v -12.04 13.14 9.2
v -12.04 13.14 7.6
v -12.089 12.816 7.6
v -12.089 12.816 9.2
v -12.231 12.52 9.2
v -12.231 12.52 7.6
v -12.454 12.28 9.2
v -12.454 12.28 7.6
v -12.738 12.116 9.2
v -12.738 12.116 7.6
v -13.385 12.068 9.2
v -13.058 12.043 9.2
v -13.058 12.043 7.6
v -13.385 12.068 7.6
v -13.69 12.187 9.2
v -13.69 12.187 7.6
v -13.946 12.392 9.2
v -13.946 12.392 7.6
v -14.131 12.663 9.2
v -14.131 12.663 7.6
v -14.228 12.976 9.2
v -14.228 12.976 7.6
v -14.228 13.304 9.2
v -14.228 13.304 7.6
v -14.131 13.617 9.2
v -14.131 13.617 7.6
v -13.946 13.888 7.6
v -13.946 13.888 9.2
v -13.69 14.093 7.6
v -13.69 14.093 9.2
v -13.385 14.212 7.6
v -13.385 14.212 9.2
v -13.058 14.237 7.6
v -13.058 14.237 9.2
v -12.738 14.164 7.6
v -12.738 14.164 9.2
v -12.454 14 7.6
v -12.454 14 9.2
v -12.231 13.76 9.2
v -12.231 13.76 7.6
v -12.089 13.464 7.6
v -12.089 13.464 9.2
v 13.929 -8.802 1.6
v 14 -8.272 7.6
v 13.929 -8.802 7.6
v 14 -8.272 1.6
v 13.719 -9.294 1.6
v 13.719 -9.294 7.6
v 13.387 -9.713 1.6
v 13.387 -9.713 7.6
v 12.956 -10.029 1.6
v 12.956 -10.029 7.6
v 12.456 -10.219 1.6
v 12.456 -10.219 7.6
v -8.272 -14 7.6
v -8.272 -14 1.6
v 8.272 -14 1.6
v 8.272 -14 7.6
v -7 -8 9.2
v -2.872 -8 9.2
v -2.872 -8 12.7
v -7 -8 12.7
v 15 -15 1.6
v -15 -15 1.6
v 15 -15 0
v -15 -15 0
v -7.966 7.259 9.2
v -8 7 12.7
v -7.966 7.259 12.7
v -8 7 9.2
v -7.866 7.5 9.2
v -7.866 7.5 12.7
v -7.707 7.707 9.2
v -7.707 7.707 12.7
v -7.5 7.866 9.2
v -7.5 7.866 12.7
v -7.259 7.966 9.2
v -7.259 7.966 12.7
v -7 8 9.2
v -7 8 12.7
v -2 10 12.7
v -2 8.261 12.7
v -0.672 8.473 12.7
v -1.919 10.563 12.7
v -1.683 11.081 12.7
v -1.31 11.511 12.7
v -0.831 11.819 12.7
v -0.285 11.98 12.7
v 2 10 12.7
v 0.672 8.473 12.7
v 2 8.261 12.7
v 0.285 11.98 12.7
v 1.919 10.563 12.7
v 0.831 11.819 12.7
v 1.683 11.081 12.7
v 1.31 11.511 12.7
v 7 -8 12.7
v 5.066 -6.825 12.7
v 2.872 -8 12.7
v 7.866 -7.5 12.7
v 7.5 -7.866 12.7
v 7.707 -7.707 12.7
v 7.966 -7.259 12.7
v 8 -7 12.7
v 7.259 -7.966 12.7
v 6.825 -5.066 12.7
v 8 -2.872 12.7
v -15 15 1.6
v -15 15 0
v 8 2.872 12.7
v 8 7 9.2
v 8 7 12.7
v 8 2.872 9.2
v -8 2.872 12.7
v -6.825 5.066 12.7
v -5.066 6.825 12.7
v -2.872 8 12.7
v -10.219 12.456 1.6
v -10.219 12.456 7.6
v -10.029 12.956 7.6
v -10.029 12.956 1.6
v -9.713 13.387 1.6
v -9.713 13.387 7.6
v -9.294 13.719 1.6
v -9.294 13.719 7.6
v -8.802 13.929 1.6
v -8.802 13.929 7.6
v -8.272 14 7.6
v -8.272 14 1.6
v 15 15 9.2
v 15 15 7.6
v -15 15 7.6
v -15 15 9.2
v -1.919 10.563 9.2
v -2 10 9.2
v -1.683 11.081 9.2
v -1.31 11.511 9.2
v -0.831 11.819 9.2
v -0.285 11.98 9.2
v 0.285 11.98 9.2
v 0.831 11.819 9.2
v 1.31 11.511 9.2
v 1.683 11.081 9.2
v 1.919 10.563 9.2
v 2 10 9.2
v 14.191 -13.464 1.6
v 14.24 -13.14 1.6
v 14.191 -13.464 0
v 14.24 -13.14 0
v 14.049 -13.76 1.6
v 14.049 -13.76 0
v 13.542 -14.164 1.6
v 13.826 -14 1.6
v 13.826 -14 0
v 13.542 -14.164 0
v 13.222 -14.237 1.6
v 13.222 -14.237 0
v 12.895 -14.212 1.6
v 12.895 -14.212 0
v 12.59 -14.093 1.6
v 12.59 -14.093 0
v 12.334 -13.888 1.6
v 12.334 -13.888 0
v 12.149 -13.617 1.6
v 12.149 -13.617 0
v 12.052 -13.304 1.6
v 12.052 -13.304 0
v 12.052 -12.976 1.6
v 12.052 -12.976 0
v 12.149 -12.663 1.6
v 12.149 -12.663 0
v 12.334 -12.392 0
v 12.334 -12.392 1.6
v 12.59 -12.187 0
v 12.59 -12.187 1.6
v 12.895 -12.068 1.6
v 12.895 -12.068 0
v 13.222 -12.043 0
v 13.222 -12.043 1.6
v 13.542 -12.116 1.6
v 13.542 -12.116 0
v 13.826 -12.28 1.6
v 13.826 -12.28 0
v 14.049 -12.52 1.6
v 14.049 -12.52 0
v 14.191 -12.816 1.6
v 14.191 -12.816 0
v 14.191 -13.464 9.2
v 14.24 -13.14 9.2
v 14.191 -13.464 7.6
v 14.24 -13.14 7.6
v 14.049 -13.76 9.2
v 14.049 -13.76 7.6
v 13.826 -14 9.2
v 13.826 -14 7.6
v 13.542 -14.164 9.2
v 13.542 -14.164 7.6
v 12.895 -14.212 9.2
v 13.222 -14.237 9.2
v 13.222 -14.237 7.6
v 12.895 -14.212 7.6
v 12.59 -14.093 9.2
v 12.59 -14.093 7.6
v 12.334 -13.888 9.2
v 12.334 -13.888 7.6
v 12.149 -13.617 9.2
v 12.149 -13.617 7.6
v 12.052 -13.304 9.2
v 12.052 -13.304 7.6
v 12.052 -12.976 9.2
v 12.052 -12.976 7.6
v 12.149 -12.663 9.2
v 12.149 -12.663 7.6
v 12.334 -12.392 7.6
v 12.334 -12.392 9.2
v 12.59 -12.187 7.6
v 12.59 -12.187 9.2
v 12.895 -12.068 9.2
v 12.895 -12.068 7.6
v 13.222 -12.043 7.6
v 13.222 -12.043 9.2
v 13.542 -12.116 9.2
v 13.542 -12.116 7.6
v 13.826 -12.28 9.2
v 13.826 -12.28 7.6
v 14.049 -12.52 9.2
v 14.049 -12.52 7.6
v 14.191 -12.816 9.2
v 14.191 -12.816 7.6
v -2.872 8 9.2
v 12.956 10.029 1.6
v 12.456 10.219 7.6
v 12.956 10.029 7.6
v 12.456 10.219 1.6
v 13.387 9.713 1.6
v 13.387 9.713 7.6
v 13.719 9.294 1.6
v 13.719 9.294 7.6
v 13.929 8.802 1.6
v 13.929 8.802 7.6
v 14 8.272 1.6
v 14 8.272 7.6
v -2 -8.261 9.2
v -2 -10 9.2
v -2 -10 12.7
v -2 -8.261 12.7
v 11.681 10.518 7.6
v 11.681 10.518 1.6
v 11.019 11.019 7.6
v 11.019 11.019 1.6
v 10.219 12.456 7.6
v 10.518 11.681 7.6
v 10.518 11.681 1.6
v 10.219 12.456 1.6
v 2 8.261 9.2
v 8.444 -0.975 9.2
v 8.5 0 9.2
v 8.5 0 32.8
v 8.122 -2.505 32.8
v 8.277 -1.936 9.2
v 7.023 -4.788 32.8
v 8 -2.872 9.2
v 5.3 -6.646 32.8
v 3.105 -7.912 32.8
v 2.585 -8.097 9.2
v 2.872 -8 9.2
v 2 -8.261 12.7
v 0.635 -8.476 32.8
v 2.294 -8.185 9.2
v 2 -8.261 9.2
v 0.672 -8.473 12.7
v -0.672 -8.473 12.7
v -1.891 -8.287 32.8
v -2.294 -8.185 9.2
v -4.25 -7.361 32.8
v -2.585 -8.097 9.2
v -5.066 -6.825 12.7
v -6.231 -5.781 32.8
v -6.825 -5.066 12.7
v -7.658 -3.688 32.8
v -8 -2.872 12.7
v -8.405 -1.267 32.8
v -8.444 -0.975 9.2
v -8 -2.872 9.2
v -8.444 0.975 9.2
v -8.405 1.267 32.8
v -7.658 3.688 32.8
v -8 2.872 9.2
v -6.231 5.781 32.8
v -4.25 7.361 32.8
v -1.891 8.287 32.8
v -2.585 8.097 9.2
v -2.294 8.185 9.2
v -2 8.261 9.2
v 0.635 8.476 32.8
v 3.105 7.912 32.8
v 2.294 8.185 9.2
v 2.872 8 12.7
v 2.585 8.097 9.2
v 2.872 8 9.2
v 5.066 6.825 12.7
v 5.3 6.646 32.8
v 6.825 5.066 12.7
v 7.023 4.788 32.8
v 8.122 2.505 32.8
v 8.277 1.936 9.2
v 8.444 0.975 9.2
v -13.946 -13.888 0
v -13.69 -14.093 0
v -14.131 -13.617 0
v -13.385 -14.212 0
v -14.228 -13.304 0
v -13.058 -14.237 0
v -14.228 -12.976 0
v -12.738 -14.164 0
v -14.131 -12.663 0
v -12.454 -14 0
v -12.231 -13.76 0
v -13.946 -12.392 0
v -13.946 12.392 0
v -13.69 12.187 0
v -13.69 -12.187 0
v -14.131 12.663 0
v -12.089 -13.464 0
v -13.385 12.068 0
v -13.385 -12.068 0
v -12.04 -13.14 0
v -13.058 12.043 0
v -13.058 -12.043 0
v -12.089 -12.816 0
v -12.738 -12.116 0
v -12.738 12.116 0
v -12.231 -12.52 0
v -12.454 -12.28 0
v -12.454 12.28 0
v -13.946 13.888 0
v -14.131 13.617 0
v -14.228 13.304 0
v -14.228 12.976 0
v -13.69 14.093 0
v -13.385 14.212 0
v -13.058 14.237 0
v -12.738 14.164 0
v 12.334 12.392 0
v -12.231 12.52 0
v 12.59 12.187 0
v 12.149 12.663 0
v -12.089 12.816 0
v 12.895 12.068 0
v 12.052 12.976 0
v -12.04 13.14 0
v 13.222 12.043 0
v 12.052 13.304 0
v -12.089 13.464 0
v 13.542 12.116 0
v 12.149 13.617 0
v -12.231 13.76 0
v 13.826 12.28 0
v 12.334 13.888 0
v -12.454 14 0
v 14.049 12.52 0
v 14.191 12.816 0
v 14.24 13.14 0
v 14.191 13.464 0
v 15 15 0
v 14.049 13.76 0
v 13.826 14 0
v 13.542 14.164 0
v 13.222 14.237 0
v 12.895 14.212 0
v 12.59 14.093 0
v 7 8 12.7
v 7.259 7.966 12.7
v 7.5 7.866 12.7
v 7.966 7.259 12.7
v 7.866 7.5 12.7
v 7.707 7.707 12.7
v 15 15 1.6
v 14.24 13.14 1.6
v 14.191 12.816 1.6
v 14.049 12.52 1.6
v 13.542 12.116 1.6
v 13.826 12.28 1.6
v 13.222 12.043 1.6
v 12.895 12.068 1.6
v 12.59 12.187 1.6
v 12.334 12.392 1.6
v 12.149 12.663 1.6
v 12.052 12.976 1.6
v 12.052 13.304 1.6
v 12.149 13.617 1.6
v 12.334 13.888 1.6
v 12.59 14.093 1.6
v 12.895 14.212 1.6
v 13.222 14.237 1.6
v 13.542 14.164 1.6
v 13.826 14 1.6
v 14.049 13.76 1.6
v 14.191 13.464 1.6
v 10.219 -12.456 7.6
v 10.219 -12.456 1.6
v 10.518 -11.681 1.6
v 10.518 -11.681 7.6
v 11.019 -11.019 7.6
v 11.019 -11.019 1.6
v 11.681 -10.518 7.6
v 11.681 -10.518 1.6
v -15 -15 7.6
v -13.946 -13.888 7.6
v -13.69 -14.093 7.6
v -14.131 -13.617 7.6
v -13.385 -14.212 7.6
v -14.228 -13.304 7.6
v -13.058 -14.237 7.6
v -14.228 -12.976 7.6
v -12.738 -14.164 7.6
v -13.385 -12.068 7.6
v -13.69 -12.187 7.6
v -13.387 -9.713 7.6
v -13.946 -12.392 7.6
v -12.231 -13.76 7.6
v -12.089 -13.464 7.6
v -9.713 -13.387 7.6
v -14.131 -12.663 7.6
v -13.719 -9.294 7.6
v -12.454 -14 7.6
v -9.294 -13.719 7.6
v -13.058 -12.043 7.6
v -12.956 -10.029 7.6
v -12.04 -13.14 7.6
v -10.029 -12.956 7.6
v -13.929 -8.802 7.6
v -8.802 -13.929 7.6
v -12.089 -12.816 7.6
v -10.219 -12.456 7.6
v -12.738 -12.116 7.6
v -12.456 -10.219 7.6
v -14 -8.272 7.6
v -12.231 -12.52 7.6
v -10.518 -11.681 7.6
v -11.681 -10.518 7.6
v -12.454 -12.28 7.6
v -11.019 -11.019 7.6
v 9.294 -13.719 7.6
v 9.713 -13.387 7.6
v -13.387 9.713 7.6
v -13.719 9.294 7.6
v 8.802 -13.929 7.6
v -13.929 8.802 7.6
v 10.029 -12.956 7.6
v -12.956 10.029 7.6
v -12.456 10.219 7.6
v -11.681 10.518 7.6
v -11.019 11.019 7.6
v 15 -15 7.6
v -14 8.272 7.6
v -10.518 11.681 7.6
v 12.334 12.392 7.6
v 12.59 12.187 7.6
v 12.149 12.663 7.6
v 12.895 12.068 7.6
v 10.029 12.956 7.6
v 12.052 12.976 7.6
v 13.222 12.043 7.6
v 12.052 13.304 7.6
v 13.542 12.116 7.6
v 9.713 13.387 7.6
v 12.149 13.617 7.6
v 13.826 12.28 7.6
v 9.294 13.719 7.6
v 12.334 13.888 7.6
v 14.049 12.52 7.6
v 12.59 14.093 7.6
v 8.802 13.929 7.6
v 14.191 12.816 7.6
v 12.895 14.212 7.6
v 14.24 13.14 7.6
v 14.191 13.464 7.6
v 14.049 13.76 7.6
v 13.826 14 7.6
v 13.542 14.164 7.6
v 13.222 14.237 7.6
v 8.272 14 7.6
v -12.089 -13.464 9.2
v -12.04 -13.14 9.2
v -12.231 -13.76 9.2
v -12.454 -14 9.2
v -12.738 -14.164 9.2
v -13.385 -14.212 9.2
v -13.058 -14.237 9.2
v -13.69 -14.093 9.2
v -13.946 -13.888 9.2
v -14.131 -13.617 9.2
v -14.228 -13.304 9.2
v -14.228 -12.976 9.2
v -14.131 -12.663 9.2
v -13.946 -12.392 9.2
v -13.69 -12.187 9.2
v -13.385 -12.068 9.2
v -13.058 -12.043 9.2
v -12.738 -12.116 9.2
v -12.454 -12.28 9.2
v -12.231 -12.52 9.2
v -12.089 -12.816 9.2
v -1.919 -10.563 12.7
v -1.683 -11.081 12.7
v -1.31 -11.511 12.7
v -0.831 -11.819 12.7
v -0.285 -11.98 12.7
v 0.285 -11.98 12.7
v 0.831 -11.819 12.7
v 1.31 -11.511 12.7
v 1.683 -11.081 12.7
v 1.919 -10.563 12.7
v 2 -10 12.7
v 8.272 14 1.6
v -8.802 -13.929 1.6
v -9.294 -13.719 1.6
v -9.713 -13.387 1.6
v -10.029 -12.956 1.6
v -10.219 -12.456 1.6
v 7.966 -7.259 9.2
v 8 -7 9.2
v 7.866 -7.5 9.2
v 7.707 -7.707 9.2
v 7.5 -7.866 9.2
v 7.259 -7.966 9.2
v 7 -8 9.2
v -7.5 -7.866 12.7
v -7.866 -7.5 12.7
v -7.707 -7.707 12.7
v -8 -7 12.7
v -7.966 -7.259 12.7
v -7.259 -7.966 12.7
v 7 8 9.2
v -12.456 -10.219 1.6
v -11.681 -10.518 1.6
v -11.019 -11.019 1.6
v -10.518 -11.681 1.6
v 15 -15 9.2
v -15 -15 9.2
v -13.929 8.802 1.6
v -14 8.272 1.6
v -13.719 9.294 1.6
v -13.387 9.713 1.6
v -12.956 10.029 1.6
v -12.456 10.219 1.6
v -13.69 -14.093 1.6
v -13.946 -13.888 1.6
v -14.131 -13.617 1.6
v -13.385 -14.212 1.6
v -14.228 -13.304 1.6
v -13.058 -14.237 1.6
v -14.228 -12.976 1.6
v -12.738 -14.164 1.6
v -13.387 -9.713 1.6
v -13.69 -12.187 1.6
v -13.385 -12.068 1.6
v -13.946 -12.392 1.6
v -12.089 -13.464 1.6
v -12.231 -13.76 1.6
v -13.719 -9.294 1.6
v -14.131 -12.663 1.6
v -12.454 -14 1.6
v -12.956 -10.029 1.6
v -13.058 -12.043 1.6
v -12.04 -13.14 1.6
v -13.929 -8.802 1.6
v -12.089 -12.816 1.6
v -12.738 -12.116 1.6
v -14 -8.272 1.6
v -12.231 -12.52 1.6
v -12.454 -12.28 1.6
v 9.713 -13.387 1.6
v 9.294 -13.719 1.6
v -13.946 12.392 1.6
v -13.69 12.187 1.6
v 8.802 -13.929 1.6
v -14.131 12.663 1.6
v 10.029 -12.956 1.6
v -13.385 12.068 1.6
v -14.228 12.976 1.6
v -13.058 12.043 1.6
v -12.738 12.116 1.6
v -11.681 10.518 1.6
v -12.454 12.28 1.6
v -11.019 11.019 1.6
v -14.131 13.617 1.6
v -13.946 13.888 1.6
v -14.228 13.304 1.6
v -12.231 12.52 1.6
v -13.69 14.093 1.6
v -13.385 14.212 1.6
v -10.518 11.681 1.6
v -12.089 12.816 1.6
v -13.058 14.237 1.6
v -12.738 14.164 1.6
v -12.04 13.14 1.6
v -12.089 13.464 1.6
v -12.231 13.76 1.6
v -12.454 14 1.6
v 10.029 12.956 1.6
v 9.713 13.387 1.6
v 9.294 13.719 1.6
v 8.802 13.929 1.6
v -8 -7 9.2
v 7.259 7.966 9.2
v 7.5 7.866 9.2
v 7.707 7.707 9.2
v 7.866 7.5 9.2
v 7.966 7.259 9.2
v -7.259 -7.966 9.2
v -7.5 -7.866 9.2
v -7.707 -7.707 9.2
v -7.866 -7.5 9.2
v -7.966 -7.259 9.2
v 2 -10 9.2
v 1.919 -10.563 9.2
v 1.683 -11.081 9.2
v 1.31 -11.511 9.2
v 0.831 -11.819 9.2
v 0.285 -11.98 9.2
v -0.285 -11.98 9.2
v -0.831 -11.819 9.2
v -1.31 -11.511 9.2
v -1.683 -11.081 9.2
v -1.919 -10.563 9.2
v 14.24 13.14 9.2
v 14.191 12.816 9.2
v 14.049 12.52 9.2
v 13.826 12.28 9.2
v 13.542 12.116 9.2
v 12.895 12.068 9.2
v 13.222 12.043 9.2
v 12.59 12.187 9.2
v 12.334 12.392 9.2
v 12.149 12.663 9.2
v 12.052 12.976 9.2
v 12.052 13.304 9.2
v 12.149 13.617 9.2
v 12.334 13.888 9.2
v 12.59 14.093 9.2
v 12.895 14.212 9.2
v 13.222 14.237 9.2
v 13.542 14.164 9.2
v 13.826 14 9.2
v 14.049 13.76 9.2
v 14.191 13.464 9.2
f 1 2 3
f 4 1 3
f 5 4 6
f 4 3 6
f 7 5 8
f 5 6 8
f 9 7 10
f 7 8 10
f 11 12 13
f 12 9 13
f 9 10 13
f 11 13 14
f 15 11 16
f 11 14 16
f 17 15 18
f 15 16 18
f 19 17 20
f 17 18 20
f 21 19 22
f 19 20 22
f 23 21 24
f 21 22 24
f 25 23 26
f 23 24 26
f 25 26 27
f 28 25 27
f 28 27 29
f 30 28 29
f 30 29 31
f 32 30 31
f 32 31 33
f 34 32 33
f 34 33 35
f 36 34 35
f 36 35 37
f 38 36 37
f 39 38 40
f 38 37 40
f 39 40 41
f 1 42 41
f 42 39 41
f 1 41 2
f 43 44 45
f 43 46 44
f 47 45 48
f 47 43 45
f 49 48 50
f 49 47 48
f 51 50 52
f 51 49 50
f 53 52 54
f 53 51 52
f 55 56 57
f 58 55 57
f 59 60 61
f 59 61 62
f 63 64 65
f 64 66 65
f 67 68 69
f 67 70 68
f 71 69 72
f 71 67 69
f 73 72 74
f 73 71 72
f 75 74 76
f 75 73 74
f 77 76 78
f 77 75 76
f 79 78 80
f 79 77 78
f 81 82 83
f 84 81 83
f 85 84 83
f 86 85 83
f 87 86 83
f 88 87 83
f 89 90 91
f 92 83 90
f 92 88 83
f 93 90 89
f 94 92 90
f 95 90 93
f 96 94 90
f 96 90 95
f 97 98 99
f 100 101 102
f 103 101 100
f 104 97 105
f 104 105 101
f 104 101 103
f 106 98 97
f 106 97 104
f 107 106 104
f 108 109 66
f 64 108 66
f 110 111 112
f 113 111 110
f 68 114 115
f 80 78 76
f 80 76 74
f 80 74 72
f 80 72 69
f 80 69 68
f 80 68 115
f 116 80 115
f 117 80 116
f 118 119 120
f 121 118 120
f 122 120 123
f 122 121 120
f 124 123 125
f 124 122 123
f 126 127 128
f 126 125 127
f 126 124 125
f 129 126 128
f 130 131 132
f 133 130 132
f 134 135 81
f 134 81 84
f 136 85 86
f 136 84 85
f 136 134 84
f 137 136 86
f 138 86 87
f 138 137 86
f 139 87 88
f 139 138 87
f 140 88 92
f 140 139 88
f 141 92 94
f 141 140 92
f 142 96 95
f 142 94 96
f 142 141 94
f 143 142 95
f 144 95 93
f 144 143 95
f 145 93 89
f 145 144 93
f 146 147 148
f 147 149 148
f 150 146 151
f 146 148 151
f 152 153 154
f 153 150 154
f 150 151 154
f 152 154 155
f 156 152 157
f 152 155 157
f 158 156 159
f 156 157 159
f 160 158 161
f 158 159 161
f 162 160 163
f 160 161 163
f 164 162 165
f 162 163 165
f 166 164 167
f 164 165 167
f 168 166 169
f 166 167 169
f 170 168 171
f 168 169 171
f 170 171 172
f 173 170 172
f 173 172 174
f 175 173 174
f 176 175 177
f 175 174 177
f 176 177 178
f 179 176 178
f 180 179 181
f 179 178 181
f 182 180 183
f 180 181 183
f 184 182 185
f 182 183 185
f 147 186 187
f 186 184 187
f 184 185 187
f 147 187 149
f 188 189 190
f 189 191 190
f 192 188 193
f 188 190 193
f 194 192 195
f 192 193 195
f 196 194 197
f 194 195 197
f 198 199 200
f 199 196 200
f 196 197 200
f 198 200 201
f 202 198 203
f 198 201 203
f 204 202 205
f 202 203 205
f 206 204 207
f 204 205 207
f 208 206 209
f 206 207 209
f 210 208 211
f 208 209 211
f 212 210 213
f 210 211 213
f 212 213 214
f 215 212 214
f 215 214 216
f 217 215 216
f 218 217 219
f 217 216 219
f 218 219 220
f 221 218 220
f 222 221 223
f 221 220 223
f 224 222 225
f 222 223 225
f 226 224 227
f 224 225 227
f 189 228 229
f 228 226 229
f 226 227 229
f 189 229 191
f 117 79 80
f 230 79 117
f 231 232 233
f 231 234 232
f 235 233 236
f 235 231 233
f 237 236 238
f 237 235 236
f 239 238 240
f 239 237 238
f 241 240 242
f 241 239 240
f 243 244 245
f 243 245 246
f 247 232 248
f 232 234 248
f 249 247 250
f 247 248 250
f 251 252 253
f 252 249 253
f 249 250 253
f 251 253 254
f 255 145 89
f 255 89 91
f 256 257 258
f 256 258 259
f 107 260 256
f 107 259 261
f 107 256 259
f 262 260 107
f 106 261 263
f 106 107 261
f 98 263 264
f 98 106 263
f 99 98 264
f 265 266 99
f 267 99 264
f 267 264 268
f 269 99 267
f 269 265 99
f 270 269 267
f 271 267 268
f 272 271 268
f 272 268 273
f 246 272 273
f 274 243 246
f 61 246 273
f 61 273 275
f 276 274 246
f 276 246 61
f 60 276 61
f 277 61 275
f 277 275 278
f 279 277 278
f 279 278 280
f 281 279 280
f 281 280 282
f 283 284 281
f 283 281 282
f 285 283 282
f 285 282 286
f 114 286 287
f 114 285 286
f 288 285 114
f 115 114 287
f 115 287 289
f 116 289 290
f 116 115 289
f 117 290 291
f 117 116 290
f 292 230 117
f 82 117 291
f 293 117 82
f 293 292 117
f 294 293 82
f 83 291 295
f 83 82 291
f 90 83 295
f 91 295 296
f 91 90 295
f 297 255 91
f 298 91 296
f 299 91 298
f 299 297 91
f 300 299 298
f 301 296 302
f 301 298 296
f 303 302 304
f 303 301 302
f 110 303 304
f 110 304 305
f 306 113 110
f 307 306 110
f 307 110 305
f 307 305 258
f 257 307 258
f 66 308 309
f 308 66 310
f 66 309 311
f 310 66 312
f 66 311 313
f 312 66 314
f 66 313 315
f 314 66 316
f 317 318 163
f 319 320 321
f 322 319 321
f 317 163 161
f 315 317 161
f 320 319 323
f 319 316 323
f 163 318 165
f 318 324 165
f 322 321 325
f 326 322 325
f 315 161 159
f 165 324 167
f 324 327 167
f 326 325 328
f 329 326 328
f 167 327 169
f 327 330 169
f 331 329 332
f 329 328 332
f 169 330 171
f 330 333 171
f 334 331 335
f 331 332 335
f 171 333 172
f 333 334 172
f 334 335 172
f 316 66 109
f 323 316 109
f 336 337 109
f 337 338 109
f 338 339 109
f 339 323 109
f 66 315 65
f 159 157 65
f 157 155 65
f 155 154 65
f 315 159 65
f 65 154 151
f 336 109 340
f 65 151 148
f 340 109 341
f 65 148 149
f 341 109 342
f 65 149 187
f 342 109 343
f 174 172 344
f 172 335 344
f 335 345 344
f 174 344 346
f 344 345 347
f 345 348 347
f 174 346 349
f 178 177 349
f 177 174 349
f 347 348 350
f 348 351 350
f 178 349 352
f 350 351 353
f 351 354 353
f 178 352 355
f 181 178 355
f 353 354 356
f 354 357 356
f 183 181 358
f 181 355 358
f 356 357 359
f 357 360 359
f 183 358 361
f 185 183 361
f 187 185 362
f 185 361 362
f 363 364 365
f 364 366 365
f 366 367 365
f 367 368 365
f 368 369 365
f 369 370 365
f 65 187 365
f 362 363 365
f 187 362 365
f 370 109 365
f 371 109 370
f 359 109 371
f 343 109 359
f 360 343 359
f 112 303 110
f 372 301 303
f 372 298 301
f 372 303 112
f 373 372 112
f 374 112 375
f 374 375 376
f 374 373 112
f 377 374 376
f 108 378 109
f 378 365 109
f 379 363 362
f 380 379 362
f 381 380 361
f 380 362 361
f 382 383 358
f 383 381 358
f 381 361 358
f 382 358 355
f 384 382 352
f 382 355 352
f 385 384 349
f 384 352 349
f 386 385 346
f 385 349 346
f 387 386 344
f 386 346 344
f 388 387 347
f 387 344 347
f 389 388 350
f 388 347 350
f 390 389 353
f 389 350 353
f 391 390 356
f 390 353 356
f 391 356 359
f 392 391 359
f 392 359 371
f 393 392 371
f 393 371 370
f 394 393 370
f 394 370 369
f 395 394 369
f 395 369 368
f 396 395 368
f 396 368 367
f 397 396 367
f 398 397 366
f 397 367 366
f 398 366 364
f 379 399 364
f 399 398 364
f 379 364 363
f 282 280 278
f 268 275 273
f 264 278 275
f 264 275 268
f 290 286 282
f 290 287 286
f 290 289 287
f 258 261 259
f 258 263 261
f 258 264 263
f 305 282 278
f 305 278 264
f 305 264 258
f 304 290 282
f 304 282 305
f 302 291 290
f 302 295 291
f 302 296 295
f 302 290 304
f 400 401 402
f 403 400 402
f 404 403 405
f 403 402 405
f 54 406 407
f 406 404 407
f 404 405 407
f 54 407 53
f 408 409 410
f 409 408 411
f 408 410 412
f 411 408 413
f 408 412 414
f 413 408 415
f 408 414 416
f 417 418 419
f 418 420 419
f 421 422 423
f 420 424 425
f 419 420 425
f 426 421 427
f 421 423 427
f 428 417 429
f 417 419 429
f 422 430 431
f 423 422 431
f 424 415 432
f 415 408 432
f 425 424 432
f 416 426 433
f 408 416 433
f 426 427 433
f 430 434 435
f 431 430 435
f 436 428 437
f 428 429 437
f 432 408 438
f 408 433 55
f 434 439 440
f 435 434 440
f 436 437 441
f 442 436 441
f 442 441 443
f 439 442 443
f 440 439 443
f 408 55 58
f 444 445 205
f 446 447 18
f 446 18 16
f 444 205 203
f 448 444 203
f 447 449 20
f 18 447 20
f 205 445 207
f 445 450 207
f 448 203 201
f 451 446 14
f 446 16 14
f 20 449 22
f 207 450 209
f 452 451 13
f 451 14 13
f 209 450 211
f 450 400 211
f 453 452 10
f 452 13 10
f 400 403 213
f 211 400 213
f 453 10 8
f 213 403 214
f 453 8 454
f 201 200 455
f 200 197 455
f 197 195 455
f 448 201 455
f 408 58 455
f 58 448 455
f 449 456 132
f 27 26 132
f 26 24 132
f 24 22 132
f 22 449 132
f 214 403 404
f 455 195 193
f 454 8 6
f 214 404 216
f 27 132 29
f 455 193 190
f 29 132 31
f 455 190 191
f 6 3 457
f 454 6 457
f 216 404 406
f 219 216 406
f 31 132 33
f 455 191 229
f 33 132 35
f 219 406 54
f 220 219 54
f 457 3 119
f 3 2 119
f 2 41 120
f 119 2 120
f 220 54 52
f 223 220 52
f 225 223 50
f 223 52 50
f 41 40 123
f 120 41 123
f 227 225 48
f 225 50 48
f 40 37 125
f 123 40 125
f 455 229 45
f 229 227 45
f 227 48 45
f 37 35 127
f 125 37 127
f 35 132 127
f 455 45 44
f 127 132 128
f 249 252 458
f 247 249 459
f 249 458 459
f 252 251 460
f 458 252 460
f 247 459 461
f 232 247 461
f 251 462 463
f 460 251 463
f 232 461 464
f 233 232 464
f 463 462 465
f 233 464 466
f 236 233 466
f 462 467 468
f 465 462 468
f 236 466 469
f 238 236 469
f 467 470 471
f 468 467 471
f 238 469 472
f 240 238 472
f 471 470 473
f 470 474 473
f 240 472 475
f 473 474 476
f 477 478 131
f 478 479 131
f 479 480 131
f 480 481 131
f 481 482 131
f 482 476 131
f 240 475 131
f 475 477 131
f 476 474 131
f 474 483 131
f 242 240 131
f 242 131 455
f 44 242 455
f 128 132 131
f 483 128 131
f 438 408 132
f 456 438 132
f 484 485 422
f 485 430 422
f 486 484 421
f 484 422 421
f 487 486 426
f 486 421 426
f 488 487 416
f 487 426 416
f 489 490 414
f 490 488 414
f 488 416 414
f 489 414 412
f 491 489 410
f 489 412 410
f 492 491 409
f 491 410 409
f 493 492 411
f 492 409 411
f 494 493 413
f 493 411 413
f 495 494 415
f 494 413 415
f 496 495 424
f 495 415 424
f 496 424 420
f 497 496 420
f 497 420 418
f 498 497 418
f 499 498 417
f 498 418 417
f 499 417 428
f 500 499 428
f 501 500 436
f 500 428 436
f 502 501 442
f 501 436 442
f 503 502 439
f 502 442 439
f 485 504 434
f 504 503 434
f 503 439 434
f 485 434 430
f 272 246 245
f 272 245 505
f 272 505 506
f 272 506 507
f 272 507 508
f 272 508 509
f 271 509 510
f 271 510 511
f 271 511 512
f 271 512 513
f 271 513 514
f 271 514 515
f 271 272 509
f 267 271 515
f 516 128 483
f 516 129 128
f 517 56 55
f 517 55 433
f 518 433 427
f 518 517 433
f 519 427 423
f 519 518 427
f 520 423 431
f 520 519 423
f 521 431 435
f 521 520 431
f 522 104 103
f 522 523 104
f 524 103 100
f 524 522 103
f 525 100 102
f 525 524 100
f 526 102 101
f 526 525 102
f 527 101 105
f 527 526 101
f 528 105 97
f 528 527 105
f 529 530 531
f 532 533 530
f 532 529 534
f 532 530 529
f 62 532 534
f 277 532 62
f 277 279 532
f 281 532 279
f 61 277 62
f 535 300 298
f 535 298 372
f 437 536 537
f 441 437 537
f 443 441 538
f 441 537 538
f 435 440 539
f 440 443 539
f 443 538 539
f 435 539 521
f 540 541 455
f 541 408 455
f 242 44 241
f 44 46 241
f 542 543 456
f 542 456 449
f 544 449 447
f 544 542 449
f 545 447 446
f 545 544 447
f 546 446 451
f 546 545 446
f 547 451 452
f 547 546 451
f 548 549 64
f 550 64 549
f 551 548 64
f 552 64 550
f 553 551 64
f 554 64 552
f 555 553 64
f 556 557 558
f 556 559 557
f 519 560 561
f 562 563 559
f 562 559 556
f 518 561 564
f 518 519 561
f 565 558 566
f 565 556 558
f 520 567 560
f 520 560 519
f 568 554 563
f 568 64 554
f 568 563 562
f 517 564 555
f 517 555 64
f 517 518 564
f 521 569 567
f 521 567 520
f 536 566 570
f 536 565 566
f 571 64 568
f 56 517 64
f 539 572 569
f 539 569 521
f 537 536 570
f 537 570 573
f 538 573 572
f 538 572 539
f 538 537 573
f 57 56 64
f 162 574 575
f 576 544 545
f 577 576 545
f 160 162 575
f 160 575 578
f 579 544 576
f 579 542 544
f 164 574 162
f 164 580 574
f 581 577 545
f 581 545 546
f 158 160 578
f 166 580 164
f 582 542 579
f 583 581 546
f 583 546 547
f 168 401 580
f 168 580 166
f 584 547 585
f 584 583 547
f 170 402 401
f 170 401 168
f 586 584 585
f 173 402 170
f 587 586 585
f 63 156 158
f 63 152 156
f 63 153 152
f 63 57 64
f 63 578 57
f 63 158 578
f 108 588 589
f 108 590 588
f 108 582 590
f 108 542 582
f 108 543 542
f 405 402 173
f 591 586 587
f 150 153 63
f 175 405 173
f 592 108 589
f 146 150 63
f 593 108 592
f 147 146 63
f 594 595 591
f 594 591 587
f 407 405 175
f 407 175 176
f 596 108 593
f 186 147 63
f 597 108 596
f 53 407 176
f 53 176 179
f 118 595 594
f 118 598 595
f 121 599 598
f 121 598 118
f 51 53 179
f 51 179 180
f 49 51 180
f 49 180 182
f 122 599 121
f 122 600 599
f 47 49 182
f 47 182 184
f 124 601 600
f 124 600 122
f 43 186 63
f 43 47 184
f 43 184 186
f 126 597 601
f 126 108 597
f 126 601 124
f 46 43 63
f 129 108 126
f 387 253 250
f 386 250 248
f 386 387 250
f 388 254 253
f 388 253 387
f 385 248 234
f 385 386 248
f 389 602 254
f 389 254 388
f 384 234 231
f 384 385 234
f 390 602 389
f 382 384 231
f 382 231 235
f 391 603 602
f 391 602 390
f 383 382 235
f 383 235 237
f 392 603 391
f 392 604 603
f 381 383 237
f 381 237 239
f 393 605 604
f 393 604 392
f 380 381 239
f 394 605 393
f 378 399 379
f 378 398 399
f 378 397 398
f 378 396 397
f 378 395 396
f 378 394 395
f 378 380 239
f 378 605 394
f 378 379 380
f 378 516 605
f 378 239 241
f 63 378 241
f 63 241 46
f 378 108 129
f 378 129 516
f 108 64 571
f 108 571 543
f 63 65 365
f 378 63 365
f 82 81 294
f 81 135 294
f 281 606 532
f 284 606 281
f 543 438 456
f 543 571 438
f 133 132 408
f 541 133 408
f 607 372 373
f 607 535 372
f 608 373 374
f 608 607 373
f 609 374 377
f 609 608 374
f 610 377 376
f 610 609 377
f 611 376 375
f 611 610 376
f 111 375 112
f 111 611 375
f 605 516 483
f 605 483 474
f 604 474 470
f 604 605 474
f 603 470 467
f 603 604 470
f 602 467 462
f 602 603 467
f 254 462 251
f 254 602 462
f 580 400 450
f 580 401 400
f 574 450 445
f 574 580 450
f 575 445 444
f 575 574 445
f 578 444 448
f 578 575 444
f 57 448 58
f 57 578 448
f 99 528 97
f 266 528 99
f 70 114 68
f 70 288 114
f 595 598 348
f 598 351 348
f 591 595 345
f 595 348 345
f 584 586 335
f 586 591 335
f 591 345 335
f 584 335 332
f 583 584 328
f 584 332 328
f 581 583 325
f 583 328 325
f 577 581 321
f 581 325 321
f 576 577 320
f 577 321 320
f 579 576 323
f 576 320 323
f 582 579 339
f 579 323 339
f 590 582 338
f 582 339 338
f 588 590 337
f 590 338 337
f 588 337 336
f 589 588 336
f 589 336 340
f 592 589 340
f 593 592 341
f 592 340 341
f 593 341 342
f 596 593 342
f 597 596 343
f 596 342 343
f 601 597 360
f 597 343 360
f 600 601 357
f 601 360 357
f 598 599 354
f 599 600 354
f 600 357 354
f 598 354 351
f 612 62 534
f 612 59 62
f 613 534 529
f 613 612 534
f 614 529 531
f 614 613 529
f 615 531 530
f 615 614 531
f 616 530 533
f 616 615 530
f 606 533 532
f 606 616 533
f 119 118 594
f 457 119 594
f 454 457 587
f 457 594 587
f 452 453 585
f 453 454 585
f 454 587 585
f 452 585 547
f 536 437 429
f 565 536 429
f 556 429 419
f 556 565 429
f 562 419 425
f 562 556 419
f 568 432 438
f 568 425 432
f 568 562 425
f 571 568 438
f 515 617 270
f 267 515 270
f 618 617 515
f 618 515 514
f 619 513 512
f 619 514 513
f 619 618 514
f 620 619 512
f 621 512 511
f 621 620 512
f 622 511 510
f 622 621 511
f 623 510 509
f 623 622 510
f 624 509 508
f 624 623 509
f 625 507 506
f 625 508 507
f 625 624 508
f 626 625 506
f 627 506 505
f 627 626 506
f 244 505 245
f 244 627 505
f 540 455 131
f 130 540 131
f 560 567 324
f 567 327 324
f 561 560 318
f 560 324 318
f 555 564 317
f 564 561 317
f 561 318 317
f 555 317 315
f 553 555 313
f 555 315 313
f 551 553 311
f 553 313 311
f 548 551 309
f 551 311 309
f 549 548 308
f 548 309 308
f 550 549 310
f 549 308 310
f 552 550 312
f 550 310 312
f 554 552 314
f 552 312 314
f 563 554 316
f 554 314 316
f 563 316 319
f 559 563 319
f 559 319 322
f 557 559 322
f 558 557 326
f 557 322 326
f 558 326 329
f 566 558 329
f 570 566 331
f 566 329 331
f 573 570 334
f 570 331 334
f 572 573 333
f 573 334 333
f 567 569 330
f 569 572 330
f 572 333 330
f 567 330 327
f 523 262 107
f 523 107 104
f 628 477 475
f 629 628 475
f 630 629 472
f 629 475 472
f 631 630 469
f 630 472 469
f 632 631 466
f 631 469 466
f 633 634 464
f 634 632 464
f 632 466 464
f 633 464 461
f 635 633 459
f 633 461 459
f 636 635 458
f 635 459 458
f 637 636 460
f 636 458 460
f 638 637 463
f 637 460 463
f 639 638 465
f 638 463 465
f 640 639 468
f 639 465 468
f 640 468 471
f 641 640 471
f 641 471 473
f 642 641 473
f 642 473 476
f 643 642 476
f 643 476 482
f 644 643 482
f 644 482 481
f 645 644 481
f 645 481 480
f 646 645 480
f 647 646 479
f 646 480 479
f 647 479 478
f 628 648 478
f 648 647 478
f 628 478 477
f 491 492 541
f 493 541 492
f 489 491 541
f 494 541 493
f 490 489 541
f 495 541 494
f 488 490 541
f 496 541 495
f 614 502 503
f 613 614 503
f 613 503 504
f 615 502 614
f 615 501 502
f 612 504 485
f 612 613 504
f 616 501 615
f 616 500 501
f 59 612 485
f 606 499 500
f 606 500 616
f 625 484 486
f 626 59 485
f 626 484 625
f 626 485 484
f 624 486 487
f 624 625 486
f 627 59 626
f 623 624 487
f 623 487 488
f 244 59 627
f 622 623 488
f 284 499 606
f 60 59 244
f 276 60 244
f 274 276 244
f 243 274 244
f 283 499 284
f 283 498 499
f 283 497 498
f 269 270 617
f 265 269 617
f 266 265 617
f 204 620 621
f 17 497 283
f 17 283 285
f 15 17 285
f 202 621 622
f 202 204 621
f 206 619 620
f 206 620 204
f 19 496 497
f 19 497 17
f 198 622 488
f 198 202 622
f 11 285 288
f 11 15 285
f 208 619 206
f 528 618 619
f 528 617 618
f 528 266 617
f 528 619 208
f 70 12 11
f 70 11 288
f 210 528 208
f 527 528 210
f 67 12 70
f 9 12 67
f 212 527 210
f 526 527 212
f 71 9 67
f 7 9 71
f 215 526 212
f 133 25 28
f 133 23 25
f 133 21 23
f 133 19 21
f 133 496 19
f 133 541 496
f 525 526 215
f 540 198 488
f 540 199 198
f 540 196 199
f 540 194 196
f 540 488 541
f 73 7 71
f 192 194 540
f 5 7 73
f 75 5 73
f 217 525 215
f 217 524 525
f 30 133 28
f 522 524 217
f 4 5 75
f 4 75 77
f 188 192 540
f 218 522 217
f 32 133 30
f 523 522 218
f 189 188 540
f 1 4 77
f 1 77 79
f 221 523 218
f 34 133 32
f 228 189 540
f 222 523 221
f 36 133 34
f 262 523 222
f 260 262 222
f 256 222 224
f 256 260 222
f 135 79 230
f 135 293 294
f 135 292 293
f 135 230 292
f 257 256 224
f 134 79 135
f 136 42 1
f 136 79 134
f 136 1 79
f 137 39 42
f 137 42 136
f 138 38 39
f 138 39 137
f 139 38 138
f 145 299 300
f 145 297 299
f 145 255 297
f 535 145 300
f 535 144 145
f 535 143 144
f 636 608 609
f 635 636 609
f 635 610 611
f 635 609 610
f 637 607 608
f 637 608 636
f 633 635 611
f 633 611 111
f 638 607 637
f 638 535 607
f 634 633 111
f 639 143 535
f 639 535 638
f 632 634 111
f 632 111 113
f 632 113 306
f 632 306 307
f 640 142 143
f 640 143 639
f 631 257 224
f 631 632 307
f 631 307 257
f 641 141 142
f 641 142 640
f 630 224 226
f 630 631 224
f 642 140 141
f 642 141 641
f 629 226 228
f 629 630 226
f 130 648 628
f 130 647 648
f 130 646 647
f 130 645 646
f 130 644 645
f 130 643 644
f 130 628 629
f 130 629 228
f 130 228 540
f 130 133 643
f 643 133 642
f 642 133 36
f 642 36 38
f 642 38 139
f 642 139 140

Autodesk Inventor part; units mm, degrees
ref_plane "YZ Plane" through (0, 0, 0) normal (1, 0, 0) x (0, 1, 0)
ref_plane "XZ Plane" through (0, 0, 0) normal (0, 1, 0) x (-1, 0, 0)
sketch "スケッチ1" plane through (0, 0, 0) normal (0, 0, 1) x (1, 0, 0)
  line L0 (-15, -15) -> (15, -15)
  line L1 (15, -15) -> (15, 15)
  line L2 (15, 15) -> (-15, 15)
  line L3 (-15, 15) -> (-15, -15)
  line L4 (-15, -15) -> (15, 15) construction
  line L5 (15, -15) -> (-15, 15) construction
  line L6 (-15, 0) -> (15, 0) construction
  line L7 (0, 15) -> (0, -15) construction
  line L8 (-13.14, 13.14) -> (13.14, 13.14) construction
  line L9 (13.14, 13.14) -> (13.14, -13.14) construction
  line L10 (13.14, -13.14) -> (-13.14, -13.14) construction
  line L11 (-13.14, -13.14) -> (-13.14, 13.14) construction
  line L12 (-13.14, 13.14) -> (13.14, -13.14) construction
  line L13 (13.14, 13.14) -> (-13.14, -13.14) construction
  circle A0 centre (0, 0) radius 8.5
  line L14 (-7, 8) -> (7, 8)
  line L15 (8, 7) -> (8, -7)
  line L16 (7, -8) -> (-7, -8)
  line L17 (-8, -7) -> (-8, 7)
  line L18 (-8, 8) -> (8, -8) construction
  line L19 (8, 8) -> (-8, -8) construction
  arc A1 (-8, -7) -> (-7, -8) centre (-7, -7) ccw
  arc A2 (7, -8) -> (8, -7) centre (7, -7) ccw
  arc A3 (8, 7) -> (7, 8) centre (7, 7) ccw
  arc A4 (-7, 8) -> (-8, 7) centre (-7, 7) ccw
  arc A5 (-2, -10) -> (2, -10) centre (0, -10) ccw
  line L20 (-2, -10) -> (-2, -8)
  line L21 (2, -10) -> (2, -8)
  arc A6 (2, 10) -> (-2, 10) centre (0, 10) ccw
  line L22 (-2, 10) -> (-2, 8)
  line L23 (2, 10) -> (2, 8)
  circle A7 centre (-13.14, -13.14) radius 1.1
  circle A8 centre (13.14, -13.14) radius 1.1
  circle A9 centre (-13.14, 13.14) radius 1.1
  circle A10 centre (13.14, 13.14) radius 1.1
  circle A11 centre (-13.14, -13.14) radius 2 construction
  circle A12 centre (13.14, -13.14) radius 2 construction
  circle A13 centre (-13.14, 13.14) radius 2 construction
  circle A14 centre (13.14, 13.14) radius 2 construction
  arc A15 (-10.219, -12.456) -> (-12.456, -10.219) centre (-13.14, -13.14) ccw
  line L24 (-14, -8.2717) -> (-14, 8.2717)
  line L25 (-8.2717, -14) -> (8.2717, -14)
  arc A16 (-14, -8.2717) -> (-12.456, -10.219) centre (-12, -8.2717) ccw
  arc A17 (-10.219, -12.456) -> (-8.2717, -14) centre (-8.2717, -12) ccw
  arc A18 (-12.456, 10.219) -> (-10.219, 12.456) centre (-13.14, 13.14) ccw
  line L26 (-8.2717, 14) -> (8.2717, 14)
  arc A19 (-12.456, 10.219) -> (-14, 8.2717) centre (-12, 8.2717) ccw
  arc A20 (-8.2717, 14) -> (-10.219, 12.456) centre (-8.2717, 12) ccw
  arc A21 (12.456, -10.219) -> (10.219, -12.456) centre (13.14, -13.14) ccw
  line L27 (14, -8.2717) -> (14, 8.2717)
  arc A22 (12.456, -10.219) -> (14, -8.2717) centre (12, -8.2717) ccw
  arc A23 (8.2717, -14) -> (10.219, -12.456) centre (8.2717, -12) ccw
  arc A24 (14, 8.2717) -> (12.456, 10.219) centre (12, 8.2717) ccw
  arc A25 (10.219, 12.456) -> (12.456, 10.219) centre (13.14, 13.14) ccw
  arc A26 (10.219, 12.456) -> (8.2717, 14) centre (8.2717, 12) ccw
  point P0 (-10.2659, -14)
  point P1 (-14, -10.2659)
  point P2 (-8, -2.8723)
  point P3 (-8, 2.8723)
  point P4 (-2.8723, 8)
  point P5 (-2, 8.2614)
  point P6 (2, 8.2614)
  point P7 (2.8723, 8)
  point P8 (8, 2.8723)
  point P9 (8, -2.8723)
  point P10 (2.8723, -8)
  point P11 (2, -8.2614)
  point P12 (-2, -8.2614)
  point P13 (-2.8723, -8)
  dimension "d0" = 30
  dimension "d1" = 30
  dimension "d2" = 26.28
  dimension "d3" = 26.28
  dimension "d4" = 17
  dimension "d5" = 16
  dimension "d6" = 16
  dimension "d7" = 1
  dimension "d8" = 20
  dimension "d9" = 2
  dimension "d10" = 2.2
  dimension "d11" = 4
  dimension "d12" = 2
  dimension "d13" = 3
  dimension "d14" = 1
  dimension "d15" = 1
extrude "押し出し1" add sketch "スケッチ1" along normal blind 9.2 contours L3 L2 L1 L0 | A15 A16 L24 A19 A18 A20 L26 A26 A25 A24 L27 A22 A21 A23 L25 A17
extrude "押し出し2" cut sketch "スケッチ1" along normal blind 7.6 contours L3 L2 L1 L0
extrude "押し出し3" add sketch "スケッチ1" along normal blind 1.6 contours L3 L2 L1 L0
extrude "押し出し4" add sketch "スケッチ1" along normal blind 12.7 contours A0 L14 A3 L15 | L15 A2 L16 A0 | A0 L22 A6 L23 | L21 A5 L20 A0 | A0 L17 A4 L14 | L16 A1 L17 A0
extrude "押し出し5" add sketch "スケッチ1" along normal blind 32.8 contours A0 L15 | L15 A0 L16 L17 L14 | L14 L23 A0 | A0 L21 L16 | L23 L14 L22 A0 | A0 L20 L16 L21 | L22 L14 A0 | A0 L16 L20 | L17 A0
ref_plane "作業平面1" through (0, 0, 27.5) normal (0, 0, 1) x (1, 0, 0)
sketch "focus of the lens" plane through (0, 0, 27.5) normal (0, 0, 1) x (1, 0, 0)
  point P0 (0, 0)
  point P1 (0, 0)
equation "\"d1\" = d0"
equation "\"d3\" = d2"
equation "\"d6\" = d5"
equation "\"d15\" = d14"
properties part number "e-CAM50_CUNX"
